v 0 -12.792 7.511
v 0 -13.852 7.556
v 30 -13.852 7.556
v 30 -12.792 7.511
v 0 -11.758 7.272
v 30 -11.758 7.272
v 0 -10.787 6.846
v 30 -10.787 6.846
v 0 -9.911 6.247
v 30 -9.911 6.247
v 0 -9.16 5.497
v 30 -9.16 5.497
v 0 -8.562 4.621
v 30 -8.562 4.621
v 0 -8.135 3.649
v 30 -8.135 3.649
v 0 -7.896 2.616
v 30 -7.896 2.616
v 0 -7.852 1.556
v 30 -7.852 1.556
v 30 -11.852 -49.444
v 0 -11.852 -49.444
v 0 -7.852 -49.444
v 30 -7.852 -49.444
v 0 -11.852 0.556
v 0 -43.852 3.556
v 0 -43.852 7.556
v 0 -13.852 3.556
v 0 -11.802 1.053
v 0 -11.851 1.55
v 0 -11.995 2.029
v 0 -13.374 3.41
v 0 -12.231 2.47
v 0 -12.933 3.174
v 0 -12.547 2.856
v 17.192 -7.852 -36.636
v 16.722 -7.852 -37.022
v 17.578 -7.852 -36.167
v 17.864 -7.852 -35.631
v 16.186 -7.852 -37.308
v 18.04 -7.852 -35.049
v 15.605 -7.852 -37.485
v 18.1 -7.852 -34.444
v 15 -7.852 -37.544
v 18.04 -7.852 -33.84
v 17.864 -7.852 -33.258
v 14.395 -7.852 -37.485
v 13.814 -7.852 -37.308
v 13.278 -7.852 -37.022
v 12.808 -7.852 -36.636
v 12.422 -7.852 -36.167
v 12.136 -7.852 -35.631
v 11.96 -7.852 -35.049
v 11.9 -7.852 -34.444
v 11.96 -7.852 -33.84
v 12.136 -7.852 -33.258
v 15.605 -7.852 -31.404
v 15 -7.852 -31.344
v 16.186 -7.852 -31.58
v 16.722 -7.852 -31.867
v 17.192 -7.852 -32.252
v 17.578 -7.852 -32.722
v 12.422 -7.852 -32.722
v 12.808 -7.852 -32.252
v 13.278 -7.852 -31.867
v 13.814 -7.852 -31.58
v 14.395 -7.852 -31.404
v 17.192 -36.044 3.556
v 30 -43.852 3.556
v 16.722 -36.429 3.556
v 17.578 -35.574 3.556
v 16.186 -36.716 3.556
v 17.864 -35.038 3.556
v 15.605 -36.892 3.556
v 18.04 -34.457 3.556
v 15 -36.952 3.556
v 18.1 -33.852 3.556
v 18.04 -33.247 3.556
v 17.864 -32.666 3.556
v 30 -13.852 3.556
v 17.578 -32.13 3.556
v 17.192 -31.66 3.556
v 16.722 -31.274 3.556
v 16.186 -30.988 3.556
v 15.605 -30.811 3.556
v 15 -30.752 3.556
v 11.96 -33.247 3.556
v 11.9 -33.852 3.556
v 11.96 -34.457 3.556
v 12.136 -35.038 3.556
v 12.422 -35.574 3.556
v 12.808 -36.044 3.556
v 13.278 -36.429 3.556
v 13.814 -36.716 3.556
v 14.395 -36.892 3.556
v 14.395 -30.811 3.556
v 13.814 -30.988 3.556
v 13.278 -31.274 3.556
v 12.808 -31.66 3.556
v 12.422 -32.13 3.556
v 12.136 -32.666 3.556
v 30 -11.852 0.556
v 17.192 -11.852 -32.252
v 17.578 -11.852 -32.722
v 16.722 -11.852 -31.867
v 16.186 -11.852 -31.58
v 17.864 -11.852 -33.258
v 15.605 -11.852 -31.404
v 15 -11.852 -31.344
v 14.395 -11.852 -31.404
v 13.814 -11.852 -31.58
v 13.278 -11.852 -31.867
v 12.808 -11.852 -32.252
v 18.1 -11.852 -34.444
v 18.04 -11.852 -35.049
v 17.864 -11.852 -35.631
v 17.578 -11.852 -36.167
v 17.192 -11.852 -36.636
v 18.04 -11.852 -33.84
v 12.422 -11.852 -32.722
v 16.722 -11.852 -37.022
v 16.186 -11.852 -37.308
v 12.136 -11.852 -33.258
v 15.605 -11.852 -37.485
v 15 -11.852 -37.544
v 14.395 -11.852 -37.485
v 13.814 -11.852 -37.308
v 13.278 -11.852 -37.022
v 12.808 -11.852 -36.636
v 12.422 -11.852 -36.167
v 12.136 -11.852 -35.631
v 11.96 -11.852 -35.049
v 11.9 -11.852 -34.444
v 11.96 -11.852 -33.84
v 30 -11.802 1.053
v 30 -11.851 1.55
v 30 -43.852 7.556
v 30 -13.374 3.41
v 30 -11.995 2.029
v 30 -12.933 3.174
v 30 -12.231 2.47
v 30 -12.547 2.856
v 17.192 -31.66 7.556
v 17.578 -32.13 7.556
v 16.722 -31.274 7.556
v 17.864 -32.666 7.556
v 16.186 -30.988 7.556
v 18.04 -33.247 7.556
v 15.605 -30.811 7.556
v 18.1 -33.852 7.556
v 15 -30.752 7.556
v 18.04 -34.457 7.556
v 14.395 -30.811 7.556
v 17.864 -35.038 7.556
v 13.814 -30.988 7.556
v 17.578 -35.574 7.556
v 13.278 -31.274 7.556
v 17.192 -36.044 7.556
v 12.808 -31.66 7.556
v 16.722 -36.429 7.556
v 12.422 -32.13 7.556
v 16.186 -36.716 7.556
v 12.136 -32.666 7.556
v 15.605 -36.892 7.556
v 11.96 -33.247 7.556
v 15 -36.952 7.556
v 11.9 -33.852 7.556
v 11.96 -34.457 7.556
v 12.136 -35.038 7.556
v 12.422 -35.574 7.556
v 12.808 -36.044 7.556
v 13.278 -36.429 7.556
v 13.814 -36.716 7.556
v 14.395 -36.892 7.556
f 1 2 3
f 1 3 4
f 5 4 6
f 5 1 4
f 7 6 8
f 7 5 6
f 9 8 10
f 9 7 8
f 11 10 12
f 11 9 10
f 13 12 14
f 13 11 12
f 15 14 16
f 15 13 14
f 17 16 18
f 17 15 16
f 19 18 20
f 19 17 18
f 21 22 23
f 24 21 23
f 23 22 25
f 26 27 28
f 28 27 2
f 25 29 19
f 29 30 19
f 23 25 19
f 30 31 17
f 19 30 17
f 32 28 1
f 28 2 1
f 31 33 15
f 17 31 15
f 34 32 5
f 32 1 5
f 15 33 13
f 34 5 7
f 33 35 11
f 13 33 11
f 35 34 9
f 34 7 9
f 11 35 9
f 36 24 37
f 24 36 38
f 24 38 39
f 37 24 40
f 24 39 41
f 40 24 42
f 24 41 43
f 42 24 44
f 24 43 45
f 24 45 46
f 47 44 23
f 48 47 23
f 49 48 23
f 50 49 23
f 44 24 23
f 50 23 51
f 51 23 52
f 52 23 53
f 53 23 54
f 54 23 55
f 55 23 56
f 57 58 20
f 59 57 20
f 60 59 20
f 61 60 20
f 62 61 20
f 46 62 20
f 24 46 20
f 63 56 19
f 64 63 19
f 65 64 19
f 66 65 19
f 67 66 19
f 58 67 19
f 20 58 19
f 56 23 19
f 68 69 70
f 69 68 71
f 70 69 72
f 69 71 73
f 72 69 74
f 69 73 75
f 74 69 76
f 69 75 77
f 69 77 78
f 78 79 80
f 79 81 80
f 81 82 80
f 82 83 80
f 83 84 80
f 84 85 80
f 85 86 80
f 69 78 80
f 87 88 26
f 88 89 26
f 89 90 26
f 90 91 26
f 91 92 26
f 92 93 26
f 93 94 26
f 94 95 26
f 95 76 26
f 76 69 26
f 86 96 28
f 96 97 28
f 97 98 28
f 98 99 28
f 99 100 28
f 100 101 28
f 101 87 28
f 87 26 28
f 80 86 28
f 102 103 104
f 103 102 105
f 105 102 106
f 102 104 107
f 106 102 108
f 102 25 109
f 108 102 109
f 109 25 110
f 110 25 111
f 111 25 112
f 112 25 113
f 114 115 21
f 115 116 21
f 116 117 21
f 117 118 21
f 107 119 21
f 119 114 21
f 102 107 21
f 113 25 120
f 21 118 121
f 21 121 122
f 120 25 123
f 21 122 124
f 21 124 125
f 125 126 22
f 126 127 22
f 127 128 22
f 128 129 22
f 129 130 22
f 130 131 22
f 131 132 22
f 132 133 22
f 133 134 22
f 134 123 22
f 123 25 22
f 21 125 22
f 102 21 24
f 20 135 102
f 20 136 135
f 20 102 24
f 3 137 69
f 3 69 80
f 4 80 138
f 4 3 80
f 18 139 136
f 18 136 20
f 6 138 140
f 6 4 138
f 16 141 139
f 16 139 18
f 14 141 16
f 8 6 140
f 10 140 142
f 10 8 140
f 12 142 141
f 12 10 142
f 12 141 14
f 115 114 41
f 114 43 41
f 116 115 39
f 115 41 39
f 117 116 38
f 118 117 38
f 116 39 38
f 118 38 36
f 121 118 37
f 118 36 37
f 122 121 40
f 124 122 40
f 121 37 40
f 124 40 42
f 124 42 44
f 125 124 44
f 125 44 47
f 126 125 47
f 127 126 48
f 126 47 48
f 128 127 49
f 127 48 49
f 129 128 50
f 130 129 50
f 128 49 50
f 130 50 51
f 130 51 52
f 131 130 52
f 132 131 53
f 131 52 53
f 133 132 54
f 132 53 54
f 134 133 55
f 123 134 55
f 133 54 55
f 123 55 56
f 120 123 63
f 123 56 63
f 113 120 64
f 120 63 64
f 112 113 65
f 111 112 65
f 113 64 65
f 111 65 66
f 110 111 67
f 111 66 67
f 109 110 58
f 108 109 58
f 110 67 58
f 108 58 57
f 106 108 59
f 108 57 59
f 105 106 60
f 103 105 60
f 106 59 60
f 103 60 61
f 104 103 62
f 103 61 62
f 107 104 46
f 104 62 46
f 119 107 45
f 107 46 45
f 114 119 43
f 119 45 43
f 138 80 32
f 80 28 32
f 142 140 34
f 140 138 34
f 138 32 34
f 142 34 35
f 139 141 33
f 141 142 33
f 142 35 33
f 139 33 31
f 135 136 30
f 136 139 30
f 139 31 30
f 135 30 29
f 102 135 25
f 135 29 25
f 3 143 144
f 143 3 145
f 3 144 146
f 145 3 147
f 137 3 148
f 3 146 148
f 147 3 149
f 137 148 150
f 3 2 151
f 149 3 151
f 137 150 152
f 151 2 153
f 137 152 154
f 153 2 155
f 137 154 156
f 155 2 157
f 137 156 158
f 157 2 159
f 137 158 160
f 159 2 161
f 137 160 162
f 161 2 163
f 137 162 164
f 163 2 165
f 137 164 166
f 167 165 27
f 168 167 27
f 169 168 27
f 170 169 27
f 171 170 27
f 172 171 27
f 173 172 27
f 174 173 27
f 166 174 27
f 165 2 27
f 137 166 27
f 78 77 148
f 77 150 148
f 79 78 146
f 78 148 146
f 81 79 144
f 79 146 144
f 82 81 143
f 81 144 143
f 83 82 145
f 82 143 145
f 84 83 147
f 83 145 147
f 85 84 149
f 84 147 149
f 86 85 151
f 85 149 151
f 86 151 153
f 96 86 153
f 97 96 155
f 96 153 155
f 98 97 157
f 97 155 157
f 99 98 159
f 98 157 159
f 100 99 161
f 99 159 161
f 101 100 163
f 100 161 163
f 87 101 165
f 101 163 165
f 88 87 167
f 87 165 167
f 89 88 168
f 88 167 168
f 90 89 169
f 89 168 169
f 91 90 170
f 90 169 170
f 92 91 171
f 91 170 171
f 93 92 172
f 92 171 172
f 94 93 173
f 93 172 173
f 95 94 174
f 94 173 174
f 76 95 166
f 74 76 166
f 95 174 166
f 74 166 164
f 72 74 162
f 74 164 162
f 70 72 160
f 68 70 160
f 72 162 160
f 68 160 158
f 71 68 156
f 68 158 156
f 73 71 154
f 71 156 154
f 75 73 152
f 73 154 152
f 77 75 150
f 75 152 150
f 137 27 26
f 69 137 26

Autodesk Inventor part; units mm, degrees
ref_plane "YZ Plane" through (0, 0, 0) normal (1, 0, 0) x (0, 1, 0)
ref_plane "XZ Plane" through (0, 0, 0) normal (0, 1, 0) x (-1, 0, 0)
ref_plane "XY Plane" through (0, 0, 0) normal (0, 0, 1) x (1, 0, 0)
sketch "Sketch1" plane through (0, 0, 0) normal (1, 0, 0) x (0, 1, 0)
  line L0 (-11.8519, 0.5556) -> (-11.8519, -49.4444)
  line L1 (-11.8519, -49.4444) -> (-7.8519, -49.4444)
  line L2 (-7.8519, -49.4444) -> (-7.8519, 1.5556)
  line L3 (-13.8519, 7.5556) -> (-43.8519, 7.5556)
  line L4 (-43.8519, 7.5556) -> (-43.8519, 3.5556)
  line L5 (-43.8519, 3.5556) -> (-13.8519, 3.5556)
  arc A0 (-7.8519, 1.5556) -> (-13.8519, 7.5556) centre (-13.5586, 1.8488) ccw
  arc A1 (-11.8519, 0.5556) -> (-13.8519, 3.5556) centre (-14.3519, 1.0556) ccw
  point P0 (0, 0)
  dimension "d0" = 4
  dimension "d1" = 4
  dimension "d2" = 50
  dimension "d3" = 57
  dimension "d4" = 30
  dimension "d18" = 30
extrude "Extrusion1" add sketch "Sketch1" along normal blind 30
sketch "Sketch2" plane through (0, -7.8519, 1.5556) normal (0, 1, 0) x (1, 0, 0)
  circle A0 centre (15, 36) radius 3.1
  line L0 (30, 51) -> (30, 0) projected
  line L1 (0, -6) -> (30, -6) projected
  point P0 (0, 1.5556)
  dimension "d8" = 6.2
  dimension "d9" = 15
  dimension "d10" = 42
extrude "Extrusion2" cut sketch "Sketch2" against normal blind 30
sketch "Sketch3" plane through (0, -43.8519, 7.5556) normal (0, 0, 1) x (1, 0, 0)
  circle A0 centre (15, 10) radius 3.1
  line L0 (30, 30) -> (30, 0) projected
  line L1 (0, 0) -> (30, 0) projected
  point P0 (0, 43.8519)
  dimension "d13" = 6.2
  dimension "d14" = 15
  dimension "d15" = 10
extrude "Extrusion3" cut sketch "Sketch3" against normal blind 30
properties part number "Slider Holding Bracket"
